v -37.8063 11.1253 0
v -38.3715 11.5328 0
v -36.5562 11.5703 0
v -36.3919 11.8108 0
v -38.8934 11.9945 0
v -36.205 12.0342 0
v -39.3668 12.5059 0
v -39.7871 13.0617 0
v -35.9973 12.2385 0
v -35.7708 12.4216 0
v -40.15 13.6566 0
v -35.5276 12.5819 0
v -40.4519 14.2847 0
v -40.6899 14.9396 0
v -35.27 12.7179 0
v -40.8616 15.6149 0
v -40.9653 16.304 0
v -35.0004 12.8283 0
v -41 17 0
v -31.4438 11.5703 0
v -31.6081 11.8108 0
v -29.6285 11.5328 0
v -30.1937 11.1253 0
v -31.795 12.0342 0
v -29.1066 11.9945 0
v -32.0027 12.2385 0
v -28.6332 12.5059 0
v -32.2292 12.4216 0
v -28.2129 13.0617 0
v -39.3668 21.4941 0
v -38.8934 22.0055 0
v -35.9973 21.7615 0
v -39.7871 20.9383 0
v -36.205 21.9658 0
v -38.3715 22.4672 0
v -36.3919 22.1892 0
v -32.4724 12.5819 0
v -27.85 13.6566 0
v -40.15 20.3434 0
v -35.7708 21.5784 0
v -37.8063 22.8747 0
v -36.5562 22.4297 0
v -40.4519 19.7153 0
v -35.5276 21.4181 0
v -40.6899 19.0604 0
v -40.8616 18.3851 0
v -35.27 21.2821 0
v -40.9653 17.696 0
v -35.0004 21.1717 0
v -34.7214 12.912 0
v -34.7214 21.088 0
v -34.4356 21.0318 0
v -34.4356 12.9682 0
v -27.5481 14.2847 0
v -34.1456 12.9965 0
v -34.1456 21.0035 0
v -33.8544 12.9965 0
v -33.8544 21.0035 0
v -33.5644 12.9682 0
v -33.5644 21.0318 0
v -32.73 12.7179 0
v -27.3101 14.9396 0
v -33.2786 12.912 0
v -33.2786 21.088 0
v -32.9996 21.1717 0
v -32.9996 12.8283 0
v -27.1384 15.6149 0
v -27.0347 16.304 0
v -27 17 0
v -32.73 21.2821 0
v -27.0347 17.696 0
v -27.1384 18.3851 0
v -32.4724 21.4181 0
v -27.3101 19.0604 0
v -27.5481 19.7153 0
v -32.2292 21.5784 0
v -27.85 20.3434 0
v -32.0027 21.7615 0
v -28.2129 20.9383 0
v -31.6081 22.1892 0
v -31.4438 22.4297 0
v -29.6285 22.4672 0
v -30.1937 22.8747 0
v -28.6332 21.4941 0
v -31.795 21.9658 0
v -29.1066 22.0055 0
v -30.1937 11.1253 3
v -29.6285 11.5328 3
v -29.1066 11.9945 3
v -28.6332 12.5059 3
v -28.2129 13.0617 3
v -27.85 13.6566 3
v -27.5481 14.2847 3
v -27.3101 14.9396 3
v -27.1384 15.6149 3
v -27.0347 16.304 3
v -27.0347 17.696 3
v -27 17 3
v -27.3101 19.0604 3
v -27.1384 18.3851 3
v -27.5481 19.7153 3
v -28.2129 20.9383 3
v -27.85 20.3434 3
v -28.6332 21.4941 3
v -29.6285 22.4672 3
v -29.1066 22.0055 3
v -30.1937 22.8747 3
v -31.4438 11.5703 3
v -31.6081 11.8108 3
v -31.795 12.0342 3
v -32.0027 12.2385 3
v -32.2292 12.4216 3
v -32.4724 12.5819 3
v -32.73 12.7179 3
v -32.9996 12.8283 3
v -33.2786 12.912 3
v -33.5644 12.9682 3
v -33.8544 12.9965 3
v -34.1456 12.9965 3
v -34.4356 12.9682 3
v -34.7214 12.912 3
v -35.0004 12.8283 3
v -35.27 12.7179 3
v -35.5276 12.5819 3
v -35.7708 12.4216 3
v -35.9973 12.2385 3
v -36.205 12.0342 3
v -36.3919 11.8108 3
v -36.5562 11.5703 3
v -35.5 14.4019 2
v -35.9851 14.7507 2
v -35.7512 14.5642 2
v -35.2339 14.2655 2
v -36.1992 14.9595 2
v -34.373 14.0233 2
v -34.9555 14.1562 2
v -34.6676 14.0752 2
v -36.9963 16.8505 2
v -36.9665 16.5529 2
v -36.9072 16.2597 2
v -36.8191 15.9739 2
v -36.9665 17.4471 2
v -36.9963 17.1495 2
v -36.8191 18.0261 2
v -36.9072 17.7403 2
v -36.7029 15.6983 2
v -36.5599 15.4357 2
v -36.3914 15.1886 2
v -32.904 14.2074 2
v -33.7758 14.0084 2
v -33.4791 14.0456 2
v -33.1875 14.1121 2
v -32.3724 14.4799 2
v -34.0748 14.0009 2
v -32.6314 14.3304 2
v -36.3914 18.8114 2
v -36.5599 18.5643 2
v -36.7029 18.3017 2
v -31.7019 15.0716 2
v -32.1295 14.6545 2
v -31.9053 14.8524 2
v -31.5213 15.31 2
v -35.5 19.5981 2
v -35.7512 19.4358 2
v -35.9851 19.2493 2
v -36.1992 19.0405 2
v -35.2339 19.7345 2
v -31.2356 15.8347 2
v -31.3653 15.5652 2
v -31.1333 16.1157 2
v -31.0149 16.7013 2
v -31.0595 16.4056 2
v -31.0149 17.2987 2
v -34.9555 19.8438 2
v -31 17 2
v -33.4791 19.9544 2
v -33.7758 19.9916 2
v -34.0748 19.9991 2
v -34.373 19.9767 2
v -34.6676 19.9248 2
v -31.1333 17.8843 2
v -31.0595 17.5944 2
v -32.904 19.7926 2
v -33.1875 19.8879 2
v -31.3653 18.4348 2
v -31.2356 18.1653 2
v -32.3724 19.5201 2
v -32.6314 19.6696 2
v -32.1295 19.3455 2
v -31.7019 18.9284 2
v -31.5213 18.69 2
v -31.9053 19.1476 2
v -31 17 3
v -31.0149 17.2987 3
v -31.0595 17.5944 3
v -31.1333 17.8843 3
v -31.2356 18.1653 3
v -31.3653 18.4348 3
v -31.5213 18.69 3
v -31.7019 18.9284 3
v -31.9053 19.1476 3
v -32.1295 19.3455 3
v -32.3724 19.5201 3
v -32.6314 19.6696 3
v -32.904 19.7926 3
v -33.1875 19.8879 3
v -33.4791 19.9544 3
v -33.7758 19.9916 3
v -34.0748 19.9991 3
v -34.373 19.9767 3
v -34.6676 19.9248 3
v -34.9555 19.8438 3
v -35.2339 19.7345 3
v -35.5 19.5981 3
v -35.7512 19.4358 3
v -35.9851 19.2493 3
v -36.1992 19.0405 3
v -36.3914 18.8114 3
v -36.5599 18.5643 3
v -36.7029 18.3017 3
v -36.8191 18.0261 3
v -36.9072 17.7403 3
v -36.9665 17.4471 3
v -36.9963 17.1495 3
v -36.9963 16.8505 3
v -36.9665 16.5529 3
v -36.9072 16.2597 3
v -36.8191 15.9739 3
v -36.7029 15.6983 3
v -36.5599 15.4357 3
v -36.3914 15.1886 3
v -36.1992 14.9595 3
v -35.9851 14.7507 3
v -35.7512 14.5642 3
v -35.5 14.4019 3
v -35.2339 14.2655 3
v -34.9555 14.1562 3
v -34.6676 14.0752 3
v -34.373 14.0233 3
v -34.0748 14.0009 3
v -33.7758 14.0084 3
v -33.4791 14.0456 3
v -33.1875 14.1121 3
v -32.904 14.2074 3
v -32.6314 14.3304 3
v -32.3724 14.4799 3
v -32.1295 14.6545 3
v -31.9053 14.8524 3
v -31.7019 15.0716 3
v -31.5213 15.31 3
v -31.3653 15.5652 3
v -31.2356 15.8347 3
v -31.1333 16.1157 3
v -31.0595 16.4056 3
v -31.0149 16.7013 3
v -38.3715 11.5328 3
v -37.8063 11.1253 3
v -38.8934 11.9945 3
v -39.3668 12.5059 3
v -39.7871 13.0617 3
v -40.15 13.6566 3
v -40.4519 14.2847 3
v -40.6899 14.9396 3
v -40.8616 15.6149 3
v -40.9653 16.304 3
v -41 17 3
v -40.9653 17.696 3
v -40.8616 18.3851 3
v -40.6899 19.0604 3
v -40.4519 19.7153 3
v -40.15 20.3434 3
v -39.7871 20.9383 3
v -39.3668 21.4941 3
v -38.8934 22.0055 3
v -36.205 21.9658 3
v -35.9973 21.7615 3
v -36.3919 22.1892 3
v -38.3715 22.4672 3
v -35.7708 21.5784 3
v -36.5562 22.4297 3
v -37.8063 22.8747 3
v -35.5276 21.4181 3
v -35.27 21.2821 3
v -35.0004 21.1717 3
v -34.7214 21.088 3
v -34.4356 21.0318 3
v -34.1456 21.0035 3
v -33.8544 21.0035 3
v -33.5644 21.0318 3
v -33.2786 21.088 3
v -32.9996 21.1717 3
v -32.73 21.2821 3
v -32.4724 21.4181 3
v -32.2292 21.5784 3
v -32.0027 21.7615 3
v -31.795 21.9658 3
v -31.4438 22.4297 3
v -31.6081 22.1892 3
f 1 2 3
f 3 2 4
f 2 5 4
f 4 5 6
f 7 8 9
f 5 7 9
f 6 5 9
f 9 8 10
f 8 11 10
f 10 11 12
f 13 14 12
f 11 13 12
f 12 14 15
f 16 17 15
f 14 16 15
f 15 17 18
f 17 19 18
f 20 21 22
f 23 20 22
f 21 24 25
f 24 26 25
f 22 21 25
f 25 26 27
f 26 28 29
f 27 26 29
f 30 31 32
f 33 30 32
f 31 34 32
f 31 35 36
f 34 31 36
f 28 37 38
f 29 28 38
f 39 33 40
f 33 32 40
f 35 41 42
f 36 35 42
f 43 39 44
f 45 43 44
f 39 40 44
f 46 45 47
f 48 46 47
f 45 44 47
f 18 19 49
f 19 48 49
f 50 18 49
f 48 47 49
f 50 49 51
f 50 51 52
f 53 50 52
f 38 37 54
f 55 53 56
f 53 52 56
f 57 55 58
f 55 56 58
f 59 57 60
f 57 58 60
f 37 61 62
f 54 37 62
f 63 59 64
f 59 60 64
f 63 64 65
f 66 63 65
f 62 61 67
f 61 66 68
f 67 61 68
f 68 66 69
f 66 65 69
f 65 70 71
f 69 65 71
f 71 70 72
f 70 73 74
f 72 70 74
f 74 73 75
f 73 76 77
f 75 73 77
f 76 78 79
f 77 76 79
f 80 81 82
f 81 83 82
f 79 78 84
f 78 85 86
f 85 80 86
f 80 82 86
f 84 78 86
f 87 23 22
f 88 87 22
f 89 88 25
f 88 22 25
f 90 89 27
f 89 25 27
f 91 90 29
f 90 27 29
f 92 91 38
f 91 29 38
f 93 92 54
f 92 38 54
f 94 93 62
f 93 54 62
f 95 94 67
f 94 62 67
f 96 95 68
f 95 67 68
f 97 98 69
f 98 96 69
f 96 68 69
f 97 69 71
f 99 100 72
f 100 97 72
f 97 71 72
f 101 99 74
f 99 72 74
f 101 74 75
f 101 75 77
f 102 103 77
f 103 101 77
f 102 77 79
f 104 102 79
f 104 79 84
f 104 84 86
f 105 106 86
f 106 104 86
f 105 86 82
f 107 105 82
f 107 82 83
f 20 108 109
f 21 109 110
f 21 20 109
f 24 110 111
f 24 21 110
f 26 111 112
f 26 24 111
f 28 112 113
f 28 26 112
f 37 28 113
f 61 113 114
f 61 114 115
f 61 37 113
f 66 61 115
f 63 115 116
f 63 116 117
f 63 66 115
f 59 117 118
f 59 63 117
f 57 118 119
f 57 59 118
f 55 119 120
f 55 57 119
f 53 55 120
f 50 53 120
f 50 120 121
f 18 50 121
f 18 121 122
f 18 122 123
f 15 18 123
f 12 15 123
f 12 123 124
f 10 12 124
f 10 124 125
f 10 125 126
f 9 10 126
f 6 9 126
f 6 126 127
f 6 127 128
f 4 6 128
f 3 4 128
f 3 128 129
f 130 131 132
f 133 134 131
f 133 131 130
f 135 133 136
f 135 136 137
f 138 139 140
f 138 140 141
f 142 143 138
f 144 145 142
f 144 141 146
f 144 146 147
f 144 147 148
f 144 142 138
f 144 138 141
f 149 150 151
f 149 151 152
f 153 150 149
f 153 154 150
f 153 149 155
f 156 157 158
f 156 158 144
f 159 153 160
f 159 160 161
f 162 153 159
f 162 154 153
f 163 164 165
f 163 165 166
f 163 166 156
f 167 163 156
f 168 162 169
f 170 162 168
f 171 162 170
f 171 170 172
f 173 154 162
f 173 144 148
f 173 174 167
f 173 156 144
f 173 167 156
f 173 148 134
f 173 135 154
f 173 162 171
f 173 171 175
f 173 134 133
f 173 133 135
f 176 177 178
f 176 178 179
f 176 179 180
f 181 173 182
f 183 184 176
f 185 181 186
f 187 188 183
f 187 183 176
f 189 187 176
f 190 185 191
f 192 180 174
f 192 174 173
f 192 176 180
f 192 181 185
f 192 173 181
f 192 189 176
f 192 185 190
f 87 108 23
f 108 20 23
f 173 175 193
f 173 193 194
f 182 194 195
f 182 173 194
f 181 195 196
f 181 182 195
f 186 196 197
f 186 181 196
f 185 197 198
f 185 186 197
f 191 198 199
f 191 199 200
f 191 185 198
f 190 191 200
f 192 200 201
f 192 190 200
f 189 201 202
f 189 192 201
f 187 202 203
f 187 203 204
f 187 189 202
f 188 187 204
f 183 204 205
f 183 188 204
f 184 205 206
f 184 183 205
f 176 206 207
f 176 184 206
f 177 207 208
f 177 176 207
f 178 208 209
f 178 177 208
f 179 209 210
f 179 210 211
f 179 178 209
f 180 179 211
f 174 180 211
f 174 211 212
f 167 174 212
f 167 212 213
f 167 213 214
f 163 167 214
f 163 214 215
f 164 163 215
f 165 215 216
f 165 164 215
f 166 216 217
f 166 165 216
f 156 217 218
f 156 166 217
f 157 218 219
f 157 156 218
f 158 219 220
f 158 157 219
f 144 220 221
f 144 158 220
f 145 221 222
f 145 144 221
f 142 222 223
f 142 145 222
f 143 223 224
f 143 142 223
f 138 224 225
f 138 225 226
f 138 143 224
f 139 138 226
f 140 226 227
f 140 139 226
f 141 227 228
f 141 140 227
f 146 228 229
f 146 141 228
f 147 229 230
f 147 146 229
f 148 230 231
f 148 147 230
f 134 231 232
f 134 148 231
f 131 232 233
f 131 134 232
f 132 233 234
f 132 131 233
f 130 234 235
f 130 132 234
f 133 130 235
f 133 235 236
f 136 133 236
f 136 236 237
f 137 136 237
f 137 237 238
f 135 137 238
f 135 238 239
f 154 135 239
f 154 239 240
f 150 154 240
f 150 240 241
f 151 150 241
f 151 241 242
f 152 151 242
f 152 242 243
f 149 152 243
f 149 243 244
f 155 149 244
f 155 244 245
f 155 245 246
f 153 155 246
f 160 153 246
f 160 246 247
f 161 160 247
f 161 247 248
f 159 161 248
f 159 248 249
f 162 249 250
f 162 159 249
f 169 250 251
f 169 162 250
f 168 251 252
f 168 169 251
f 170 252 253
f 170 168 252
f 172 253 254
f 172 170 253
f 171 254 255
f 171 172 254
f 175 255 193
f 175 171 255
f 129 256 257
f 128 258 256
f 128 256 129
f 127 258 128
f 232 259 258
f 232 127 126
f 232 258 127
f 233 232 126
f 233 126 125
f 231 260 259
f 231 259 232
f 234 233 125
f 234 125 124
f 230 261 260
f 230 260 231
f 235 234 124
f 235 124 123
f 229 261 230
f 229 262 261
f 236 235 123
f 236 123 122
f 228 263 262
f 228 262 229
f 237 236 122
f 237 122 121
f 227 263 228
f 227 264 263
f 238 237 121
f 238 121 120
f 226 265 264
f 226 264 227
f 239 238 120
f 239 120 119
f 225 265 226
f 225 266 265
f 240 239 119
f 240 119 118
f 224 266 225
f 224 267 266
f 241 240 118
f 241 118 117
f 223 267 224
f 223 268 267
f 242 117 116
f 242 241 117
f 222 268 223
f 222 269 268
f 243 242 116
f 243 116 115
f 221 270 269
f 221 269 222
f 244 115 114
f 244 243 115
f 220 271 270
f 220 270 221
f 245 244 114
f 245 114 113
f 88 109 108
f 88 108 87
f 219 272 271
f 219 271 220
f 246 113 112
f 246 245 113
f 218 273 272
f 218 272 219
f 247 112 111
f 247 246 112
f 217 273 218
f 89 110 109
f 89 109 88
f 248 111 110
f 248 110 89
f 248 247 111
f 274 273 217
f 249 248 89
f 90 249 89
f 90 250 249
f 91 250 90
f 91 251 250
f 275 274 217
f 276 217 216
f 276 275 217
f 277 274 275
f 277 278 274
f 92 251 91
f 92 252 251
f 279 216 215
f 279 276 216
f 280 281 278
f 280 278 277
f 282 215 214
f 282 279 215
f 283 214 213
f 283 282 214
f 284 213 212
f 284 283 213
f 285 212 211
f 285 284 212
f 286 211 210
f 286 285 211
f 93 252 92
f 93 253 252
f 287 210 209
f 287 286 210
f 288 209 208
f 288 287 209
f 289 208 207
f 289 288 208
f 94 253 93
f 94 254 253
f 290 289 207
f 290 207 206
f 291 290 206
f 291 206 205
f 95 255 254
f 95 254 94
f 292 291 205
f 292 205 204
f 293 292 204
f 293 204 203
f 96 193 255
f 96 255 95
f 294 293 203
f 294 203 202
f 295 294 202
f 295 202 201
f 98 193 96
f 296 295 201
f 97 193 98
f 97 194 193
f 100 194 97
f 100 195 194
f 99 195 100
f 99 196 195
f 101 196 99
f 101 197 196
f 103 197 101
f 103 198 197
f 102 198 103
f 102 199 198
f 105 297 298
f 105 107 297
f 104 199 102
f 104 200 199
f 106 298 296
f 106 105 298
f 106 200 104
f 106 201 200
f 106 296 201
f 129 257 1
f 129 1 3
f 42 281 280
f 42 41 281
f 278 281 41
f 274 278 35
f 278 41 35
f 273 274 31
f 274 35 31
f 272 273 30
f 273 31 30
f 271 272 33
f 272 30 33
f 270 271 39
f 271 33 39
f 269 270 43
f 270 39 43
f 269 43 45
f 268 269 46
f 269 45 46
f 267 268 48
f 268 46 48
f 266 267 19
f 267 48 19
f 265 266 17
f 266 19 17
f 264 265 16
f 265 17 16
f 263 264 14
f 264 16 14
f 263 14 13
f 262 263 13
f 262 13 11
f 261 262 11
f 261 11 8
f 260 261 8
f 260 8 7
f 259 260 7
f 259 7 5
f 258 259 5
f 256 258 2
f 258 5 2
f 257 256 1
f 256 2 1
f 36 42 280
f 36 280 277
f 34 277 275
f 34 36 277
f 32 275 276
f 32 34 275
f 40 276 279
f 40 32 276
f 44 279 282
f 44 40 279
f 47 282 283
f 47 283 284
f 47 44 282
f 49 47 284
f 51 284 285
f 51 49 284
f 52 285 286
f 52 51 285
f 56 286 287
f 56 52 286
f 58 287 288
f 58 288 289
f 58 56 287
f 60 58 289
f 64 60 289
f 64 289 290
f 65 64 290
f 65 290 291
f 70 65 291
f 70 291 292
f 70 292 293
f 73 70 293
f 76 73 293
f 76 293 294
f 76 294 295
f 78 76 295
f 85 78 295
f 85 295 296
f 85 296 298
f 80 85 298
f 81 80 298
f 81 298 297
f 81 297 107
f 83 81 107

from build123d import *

# Parameters (mm, degrees)
CYLINDER001_R     = 3
CYLINDER001_DEPTH = 1
CYLINDER004_R     = 3
CYLINDER004_DEPTH = 3
CYLINDER003_R     = 3
CYLINDER003_DEPTH = 3
CYLINDER002_R     = 7
CYLINDER002_DEPTH = 3
CHAMFER_SIZE      = 1


with BuildPart() as cilindro001:
    # Cylinder001 → Cylinder001 (new body)
    with BuildSketch(Plane(origin=(4, 16, -1), x_dir=(1, 0, 0), z_dir=(0, 0, 1))):
        Circle(CYLINDER001_R)
    extrude(amount=CYLINDER001_DEPTH)


with BuildPart() as cilindro004:
    # Cylinder004 → Cylinder004 (new body)
    with BuildSketch(Plane(origin=(4, 9, -3), x_dir=(1, 0, 0), z_dir=(0, 0, 1))):
        Circle(CYLINDER004_R)
    extrude(amount=CYLINDER004_DEPTH)


with BuildPart() as cilindro003:
    # Cylinder003 → Cylinder003 (new body)
    with BuildSketch(Plane(origin=(4, 23, -3), x_dir=(1, 0, 0), z_dir=(0, 0, 1))):
        Circle(CYLINDER003_R)
    extrude(amount=CYLINDER003_DEPTH)


with BuildPart() as chamfer_body:
    # Cylinder002 → Cylinder002 (new body)
    with BuildSketch(Plane(origin=(4, 16, -3), x_dir=(1, 0, 0), z_dir=(0, 0, 1))):
        Circle(CYLINDER002_R)
    extrude(amount=CYLINDER002_DEPTH)

    # Cut003: cut Cilindro003
    add(cilindro003.part, mode=Mode.SUBTRACT)

    # Cut004: cut Cilindro004
    add(cilindro004.part, mode=Mode.SUBTRACT)

    # Cut005: cut Cilindro001
    add(cilindro001.part, mode=Mode.SUBTRACT)

    # Chamfer
    chamfer_edges = [chamfer_body.edges().sort_by_distance(p)[0] for p in [
        (6.930313, 22.357143, -1.5),
        (1.069687, 22.357143, -1.5),
        (6.930313, 9.642857, -1.5),
        (1.069687, 9.642857, -1.5),
    ]]
    chamfer(chamfer_edges, length=CHAMFER_SIZE)


with BuildPart() as chamfer_body_1:
    # Chamfer placement: moved
    add(chamfer_body.part.moved(Location((-38, 1, 3))))


solid = chamfer_body_1.part
